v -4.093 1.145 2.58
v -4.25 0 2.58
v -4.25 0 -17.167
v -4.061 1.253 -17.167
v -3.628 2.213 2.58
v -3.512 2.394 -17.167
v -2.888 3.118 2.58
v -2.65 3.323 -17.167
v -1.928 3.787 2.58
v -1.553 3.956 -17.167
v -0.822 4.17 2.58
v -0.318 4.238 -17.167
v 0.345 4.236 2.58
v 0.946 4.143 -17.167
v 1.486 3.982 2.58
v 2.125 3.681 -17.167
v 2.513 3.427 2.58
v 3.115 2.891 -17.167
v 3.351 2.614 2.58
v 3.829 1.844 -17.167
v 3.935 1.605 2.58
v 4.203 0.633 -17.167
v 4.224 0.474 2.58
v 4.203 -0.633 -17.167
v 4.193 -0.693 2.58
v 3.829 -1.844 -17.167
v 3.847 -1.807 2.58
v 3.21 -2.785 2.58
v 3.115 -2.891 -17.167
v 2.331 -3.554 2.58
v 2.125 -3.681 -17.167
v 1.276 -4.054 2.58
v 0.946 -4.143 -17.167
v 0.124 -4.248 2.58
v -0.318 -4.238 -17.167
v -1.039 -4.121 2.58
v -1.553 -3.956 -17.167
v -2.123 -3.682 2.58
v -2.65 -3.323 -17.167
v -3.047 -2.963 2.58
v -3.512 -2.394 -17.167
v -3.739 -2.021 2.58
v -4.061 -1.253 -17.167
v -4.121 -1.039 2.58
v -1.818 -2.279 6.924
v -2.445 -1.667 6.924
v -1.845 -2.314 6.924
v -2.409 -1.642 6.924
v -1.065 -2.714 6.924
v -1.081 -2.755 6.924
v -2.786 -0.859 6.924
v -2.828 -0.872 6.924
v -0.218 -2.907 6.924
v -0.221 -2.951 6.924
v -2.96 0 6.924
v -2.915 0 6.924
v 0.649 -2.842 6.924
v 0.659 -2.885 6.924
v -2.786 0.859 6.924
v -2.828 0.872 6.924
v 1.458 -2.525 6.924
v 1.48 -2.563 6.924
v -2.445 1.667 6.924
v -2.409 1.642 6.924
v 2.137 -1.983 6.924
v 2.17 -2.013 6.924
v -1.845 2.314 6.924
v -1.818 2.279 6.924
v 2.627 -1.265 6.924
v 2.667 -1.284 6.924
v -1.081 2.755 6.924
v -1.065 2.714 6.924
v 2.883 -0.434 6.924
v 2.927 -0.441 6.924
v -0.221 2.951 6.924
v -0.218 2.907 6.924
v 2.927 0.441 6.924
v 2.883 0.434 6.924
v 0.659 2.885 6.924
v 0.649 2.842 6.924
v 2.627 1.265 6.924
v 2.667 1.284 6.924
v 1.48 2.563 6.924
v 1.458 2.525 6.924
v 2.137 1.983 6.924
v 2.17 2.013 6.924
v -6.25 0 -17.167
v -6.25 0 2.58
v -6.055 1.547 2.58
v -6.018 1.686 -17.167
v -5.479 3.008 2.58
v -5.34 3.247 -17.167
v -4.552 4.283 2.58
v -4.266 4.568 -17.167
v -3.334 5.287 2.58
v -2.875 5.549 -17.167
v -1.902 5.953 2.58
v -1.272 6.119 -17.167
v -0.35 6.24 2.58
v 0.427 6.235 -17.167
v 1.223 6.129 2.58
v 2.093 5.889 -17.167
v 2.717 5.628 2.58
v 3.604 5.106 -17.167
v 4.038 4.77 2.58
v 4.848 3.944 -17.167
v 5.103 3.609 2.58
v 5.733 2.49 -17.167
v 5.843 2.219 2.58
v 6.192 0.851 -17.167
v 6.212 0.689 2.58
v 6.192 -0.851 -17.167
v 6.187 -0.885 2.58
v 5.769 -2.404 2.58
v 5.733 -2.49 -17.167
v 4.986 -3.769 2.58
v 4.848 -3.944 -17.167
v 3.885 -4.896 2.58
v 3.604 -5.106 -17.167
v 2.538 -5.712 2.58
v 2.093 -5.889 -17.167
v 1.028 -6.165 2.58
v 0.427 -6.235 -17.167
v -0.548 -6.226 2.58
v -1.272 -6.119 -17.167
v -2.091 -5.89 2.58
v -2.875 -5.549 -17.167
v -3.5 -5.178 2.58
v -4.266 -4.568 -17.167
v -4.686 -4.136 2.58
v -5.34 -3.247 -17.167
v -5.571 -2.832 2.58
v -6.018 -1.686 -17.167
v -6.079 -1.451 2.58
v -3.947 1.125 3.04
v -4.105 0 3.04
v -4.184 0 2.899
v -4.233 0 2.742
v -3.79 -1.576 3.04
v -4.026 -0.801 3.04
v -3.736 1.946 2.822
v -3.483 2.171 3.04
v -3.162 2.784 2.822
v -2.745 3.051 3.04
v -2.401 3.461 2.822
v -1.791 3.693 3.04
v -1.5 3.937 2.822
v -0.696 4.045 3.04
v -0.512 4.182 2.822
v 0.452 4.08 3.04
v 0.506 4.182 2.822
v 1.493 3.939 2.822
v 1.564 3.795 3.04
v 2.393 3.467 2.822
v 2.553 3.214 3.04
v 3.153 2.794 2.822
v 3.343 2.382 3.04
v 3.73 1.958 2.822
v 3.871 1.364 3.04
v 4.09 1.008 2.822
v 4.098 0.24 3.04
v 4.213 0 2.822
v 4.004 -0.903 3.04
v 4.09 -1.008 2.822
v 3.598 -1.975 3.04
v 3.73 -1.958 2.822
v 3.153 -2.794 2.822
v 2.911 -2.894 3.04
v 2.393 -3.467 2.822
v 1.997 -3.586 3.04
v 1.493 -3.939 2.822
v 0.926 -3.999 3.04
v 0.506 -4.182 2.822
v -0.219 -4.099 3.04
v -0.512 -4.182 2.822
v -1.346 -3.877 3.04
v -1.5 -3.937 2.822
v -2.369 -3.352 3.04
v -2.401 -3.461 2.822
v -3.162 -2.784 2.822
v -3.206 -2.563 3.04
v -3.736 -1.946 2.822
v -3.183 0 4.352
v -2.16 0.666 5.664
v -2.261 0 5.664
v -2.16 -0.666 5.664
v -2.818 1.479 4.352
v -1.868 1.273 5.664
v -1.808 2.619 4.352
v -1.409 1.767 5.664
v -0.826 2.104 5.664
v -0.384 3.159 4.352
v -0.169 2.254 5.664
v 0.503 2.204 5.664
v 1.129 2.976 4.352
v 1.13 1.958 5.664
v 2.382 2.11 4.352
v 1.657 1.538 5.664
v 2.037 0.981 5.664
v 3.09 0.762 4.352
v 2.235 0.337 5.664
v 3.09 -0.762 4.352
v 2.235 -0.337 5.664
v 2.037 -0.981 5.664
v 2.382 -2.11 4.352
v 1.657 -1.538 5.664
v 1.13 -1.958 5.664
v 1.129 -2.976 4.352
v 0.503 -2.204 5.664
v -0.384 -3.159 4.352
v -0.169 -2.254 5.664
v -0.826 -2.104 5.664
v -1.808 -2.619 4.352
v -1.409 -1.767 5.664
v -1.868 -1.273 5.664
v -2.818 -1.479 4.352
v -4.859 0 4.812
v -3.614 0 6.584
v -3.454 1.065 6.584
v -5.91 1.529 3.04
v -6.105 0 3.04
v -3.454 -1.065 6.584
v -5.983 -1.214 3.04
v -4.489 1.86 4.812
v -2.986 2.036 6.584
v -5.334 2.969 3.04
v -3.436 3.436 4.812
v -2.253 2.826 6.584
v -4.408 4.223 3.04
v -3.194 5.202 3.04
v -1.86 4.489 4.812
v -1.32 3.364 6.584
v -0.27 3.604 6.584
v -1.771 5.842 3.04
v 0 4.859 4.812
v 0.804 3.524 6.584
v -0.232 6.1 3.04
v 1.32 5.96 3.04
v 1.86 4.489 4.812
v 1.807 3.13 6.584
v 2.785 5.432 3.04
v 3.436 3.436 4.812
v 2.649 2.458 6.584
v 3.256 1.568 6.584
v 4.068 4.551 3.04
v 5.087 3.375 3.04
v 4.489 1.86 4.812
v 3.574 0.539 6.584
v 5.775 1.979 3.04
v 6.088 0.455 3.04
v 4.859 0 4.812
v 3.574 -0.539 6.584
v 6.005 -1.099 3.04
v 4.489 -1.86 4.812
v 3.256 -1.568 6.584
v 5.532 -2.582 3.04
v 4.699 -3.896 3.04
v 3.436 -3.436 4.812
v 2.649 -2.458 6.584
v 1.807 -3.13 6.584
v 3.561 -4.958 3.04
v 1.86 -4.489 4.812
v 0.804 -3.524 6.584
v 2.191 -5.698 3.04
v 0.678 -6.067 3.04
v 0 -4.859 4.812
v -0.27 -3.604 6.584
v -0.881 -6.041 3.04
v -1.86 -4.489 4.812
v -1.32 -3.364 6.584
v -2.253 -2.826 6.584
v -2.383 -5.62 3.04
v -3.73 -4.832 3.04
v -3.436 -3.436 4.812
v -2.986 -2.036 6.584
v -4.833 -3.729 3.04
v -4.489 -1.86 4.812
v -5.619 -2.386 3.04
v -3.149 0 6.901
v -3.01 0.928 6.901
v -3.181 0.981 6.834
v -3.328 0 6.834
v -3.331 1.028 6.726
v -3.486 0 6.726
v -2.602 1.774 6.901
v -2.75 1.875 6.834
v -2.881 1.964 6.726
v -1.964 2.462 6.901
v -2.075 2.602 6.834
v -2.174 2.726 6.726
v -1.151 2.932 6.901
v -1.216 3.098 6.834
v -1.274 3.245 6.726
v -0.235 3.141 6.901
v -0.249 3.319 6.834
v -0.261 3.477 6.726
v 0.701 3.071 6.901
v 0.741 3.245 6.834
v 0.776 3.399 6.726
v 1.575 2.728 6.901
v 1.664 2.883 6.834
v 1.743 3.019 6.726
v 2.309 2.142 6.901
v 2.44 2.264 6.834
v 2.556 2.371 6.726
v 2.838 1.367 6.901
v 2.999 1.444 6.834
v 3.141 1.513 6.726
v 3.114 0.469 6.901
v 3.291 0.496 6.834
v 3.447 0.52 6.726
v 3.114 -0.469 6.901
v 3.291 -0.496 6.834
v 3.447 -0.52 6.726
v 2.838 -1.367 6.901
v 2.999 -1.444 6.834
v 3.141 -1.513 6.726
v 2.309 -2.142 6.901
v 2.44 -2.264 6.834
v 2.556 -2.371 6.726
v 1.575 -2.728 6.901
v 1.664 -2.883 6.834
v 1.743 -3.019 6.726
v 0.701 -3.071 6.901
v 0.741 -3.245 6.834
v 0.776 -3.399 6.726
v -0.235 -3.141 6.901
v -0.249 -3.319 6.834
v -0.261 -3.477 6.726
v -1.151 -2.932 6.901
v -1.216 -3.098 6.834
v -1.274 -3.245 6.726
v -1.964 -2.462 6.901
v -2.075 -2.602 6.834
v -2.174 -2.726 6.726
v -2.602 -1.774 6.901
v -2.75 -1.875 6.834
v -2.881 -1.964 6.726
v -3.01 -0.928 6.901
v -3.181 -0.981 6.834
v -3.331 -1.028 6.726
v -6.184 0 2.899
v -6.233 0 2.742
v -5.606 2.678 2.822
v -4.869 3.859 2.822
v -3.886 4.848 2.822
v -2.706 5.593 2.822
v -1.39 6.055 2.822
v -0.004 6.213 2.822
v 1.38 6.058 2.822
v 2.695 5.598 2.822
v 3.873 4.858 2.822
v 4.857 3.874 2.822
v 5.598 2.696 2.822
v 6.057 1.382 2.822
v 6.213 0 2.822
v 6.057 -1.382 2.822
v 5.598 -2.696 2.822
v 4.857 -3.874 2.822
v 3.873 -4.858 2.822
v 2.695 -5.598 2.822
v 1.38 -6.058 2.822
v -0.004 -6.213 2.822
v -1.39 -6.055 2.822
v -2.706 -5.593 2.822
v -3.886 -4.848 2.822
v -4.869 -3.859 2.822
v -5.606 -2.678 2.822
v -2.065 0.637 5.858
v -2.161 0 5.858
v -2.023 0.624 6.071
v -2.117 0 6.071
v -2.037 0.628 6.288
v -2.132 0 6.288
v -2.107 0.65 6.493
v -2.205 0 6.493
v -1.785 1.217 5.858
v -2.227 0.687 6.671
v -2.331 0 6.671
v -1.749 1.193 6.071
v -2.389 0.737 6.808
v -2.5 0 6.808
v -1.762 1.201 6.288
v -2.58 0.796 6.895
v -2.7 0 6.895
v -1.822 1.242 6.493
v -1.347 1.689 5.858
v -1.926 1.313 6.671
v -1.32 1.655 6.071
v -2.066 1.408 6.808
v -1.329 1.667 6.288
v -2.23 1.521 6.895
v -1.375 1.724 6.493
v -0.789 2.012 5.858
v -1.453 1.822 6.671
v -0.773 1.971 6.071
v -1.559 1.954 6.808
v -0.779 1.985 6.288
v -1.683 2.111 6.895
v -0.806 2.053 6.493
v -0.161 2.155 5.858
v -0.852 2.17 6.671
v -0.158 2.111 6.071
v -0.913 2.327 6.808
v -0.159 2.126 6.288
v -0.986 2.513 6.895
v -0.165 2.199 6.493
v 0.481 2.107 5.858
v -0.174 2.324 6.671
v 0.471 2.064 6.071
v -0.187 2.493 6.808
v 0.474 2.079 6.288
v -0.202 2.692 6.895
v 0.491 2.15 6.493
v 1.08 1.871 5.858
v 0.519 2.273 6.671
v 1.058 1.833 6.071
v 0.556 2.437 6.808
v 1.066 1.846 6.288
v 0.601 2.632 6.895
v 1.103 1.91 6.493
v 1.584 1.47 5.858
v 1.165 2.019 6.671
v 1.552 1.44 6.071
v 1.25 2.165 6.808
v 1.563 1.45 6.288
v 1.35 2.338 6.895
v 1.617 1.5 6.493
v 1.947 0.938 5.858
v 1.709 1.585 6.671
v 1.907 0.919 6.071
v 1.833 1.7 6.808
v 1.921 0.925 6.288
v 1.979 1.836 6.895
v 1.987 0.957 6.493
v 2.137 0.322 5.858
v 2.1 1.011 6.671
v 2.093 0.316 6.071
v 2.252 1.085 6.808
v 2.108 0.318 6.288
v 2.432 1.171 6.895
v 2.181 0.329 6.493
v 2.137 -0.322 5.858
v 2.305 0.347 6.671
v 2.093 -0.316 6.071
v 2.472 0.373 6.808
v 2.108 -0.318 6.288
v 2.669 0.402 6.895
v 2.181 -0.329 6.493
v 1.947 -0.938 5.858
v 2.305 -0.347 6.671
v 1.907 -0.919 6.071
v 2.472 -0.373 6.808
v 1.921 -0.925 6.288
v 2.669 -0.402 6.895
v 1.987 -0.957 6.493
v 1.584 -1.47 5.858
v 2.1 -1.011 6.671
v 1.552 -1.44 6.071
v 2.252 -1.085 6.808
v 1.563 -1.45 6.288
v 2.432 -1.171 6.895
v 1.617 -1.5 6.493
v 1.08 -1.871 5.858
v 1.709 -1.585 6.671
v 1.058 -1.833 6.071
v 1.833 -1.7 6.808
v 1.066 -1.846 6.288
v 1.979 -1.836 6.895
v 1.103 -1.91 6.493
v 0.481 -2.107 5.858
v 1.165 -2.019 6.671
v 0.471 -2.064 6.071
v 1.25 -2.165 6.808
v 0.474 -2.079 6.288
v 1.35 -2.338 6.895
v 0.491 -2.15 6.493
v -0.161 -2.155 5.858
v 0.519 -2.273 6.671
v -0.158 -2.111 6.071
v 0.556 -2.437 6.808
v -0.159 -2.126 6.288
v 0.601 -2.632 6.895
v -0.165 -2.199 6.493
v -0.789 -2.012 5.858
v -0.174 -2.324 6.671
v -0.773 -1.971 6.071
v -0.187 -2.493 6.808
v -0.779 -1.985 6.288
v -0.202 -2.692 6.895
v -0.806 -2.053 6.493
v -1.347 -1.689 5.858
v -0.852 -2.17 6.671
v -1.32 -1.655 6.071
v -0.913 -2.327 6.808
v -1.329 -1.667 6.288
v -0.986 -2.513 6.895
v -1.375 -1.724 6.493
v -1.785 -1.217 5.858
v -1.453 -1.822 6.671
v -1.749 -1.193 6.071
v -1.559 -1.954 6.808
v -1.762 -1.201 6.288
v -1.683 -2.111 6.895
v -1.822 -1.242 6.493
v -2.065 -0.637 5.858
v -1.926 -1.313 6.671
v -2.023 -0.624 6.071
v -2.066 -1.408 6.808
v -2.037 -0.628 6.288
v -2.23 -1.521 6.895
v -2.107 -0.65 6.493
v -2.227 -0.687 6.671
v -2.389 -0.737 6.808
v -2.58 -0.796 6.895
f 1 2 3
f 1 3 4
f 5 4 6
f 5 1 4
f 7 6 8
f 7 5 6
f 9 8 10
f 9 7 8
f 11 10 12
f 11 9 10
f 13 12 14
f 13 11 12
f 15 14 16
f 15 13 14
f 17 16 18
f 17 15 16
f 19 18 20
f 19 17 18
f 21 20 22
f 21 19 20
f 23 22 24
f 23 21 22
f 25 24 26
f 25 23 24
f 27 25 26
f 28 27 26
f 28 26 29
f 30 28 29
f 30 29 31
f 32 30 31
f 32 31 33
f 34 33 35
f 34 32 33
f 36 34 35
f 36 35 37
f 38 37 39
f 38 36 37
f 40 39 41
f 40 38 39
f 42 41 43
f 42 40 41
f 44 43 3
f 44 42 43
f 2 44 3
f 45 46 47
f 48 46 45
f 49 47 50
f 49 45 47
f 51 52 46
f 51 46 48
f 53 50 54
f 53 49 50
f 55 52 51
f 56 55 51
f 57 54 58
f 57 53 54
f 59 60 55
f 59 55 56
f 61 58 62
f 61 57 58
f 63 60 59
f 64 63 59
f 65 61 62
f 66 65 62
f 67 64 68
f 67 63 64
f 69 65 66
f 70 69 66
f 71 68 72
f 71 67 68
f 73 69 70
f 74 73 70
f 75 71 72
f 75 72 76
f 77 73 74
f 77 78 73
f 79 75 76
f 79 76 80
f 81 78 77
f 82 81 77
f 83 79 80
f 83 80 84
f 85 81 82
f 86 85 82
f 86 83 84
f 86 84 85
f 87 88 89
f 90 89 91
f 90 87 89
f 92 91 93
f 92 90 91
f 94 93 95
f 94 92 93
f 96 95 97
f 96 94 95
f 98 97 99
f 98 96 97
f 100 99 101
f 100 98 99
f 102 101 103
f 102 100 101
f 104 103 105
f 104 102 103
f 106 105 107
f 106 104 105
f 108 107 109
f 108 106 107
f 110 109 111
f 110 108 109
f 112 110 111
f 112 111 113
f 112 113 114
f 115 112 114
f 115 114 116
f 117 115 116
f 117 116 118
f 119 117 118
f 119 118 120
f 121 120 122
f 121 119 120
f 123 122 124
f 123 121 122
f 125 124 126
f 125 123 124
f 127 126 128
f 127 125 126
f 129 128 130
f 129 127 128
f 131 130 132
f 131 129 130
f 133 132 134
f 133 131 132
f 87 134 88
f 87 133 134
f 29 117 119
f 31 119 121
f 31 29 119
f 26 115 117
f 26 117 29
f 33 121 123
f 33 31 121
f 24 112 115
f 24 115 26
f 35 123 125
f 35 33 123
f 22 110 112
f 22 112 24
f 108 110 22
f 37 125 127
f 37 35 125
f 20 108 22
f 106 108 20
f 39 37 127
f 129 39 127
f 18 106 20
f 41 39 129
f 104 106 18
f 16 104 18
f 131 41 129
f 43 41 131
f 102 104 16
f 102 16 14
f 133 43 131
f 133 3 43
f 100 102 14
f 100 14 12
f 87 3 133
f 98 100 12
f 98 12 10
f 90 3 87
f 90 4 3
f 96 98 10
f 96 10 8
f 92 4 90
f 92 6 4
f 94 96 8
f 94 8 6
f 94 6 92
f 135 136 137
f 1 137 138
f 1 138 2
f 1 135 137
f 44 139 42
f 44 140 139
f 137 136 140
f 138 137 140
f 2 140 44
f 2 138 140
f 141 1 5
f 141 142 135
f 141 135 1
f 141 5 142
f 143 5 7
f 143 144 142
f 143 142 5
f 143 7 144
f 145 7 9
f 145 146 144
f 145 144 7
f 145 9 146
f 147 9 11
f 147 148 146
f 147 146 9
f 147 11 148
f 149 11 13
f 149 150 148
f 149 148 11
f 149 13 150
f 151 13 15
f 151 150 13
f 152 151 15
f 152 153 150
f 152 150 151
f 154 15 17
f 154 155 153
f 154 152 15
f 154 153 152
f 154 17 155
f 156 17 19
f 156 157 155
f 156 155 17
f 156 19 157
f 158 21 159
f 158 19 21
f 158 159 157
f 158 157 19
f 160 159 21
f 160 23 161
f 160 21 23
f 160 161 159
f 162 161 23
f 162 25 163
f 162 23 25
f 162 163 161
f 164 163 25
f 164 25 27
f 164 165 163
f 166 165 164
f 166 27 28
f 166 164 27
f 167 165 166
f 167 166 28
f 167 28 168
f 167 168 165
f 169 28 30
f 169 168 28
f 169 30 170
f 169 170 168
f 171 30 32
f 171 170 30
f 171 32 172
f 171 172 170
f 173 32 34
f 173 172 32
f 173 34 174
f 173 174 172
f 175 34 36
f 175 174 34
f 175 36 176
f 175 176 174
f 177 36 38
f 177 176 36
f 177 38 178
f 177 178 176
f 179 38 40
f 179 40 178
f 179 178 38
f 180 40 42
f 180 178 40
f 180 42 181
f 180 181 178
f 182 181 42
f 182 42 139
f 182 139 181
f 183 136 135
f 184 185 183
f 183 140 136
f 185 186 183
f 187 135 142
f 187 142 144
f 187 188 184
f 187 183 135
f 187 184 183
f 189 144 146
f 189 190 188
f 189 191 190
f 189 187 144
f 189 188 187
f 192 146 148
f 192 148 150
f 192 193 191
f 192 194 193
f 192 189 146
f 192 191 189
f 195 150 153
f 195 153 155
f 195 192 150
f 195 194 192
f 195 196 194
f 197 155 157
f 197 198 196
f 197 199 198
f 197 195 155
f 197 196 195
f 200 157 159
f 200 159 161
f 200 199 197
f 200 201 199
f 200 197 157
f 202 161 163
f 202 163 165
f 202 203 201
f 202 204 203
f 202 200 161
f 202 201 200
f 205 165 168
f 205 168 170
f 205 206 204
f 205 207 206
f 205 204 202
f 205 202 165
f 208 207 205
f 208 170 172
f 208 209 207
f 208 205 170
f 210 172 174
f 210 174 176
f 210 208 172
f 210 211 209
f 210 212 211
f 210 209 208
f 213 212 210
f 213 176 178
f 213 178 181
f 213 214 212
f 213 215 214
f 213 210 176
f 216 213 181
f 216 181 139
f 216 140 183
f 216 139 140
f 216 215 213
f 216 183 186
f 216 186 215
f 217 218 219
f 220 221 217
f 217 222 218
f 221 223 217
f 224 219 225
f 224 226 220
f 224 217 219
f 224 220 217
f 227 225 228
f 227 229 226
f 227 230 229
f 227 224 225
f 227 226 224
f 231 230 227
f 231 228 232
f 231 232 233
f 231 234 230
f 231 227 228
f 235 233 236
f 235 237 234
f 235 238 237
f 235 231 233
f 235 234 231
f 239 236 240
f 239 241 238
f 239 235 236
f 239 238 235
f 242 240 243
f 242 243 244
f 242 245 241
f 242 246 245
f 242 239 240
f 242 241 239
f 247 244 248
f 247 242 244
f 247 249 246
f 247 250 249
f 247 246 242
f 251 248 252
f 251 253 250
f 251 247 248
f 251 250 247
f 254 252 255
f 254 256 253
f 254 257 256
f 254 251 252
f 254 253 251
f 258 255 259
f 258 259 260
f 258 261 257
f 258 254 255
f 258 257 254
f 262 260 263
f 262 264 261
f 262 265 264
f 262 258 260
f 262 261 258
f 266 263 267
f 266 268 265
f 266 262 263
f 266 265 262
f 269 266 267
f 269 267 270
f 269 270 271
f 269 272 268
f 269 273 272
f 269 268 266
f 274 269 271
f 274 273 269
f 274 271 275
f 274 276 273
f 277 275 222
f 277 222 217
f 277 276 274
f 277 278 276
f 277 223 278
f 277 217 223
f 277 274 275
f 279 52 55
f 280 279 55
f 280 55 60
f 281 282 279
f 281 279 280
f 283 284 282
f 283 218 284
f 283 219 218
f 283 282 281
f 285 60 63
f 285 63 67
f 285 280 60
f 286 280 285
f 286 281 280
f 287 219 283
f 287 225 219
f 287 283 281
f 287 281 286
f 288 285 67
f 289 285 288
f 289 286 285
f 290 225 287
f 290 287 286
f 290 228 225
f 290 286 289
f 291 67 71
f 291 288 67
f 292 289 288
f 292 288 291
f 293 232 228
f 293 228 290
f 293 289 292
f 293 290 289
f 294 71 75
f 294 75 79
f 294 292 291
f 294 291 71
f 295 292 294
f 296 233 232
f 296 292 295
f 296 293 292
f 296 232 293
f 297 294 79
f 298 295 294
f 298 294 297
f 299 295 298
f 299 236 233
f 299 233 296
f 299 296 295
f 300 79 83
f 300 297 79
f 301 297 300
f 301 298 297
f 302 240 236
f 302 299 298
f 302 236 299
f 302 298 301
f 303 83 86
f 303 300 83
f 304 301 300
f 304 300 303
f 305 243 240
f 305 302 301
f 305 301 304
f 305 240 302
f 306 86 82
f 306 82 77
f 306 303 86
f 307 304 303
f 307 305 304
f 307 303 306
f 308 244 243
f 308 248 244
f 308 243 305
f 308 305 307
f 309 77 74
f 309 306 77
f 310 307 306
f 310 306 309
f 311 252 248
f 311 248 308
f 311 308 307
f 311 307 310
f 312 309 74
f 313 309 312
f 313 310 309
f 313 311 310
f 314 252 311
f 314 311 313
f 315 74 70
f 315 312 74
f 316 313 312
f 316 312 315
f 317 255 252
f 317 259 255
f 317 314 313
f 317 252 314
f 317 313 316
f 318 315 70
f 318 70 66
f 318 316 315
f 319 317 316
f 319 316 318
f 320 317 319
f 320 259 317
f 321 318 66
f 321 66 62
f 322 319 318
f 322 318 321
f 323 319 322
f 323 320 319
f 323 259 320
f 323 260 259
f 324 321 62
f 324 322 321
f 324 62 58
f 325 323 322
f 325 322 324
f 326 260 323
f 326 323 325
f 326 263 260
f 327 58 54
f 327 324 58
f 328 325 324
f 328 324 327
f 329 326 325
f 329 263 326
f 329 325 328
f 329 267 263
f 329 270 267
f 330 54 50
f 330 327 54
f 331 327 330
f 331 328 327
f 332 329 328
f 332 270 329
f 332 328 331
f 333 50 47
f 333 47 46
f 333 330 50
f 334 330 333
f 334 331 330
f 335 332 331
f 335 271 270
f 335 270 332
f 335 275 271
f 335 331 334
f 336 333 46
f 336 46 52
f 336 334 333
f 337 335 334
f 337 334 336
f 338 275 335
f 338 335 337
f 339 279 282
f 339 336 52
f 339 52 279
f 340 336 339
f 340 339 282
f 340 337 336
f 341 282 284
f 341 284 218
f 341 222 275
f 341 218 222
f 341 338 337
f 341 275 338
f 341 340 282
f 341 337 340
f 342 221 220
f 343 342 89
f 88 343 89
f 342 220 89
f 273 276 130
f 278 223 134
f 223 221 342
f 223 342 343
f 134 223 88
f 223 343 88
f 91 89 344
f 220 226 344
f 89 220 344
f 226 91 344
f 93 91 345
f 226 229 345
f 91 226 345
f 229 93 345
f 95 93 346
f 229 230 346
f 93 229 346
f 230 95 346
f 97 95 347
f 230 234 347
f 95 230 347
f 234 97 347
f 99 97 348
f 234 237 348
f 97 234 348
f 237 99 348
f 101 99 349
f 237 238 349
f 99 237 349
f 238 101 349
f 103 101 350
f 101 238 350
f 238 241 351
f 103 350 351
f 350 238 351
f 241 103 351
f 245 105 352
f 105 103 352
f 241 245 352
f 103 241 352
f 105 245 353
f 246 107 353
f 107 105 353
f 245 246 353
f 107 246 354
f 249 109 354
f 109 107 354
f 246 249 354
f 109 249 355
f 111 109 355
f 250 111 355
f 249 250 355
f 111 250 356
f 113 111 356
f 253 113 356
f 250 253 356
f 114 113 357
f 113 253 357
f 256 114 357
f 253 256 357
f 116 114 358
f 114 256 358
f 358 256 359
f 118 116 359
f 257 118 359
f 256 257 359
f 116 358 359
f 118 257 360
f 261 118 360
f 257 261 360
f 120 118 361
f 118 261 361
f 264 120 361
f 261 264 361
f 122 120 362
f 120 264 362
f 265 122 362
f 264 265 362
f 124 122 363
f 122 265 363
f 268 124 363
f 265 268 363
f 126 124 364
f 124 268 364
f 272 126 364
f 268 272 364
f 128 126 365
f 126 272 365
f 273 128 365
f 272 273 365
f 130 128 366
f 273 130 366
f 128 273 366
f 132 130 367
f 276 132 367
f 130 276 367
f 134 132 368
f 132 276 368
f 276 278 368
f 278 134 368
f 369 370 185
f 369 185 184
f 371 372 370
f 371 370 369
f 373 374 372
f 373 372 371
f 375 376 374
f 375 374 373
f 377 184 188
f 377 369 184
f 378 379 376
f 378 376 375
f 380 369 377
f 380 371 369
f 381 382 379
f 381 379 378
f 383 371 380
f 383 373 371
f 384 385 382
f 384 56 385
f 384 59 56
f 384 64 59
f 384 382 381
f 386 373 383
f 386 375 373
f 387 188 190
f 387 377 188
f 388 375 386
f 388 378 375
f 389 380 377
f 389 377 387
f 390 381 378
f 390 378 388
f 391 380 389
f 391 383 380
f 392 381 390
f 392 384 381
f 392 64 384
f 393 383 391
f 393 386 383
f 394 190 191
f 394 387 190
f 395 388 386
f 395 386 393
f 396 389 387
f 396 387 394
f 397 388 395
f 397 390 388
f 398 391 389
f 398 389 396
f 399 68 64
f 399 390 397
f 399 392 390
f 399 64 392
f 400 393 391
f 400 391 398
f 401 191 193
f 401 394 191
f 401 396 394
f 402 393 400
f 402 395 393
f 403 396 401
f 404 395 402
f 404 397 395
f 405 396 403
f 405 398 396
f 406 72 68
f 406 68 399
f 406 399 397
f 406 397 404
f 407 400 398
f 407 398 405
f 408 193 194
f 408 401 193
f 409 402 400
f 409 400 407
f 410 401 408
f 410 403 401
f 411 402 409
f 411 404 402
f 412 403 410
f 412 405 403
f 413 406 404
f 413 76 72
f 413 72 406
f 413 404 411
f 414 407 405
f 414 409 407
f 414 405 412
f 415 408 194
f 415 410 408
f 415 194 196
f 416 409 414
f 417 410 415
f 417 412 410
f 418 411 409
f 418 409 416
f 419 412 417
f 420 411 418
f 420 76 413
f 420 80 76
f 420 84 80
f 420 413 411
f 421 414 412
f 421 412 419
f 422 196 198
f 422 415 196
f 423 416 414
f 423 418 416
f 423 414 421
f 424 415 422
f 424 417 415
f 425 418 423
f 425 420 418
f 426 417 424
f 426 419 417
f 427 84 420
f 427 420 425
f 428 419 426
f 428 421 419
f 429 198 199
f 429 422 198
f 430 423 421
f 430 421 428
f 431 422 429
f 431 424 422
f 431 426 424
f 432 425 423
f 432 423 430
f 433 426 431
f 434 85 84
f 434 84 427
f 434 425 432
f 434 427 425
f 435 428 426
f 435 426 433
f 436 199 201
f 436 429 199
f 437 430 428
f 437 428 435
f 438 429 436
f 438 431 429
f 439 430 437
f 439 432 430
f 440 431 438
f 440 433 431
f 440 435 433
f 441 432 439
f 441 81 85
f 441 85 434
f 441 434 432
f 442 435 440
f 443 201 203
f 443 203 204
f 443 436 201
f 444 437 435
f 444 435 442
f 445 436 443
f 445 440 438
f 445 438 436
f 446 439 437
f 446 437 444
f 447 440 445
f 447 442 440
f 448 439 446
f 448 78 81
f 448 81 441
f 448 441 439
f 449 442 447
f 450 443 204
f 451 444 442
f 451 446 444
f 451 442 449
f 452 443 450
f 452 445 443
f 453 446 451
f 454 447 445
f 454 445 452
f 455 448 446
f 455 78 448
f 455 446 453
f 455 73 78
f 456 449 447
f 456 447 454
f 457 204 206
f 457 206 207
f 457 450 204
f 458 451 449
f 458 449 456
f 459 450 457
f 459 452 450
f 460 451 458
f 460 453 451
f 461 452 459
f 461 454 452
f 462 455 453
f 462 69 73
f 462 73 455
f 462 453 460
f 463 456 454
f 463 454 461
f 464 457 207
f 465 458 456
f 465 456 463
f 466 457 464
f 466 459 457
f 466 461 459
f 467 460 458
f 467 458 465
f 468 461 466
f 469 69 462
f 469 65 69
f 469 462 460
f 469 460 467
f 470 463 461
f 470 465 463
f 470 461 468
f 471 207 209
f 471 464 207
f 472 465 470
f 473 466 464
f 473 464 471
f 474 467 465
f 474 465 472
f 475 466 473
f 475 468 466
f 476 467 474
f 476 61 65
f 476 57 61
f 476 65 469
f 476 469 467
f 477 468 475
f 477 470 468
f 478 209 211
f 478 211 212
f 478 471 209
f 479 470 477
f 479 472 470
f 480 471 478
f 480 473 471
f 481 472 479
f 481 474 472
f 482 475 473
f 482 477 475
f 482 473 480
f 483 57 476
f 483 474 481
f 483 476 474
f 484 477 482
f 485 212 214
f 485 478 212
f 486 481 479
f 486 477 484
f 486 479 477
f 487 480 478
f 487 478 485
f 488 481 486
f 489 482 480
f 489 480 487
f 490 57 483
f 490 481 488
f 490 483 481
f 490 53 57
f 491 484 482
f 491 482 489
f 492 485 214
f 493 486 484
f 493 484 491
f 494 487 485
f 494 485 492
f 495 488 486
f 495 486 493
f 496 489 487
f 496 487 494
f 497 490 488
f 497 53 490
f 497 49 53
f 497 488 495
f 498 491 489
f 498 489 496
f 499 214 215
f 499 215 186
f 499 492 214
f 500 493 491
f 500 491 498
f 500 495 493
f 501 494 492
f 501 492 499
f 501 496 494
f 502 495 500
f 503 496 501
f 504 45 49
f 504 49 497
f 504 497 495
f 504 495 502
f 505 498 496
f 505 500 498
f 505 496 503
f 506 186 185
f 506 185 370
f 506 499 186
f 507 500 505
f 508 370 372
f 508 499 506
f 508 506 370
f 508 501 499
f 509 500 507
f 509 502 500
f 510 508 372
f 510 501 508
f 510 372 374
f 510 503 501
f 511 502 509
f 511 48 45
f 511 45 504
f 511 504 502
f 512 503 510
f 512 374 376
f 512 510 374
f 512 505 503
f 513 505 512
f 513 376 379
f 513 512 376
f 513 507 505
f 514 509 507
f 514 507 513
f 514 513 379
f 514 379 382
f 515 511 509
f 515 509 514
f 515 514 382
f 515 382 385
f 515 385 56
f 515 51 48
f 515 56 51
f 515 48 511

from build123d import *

# Parameters (mm, degrees)
F2_R = 0.8


with BuildPart() as f1:
    # F0 (on Front) → F1 (revolve)
    with BuildSketch(Plane.XZ):
        Polygon((-4.25, 2.833334), (-1.375272, 6.924292), (-3.375272, 6.924292), (-6.25, 2.833334), (-6.25, -17.166666), (-4.25, -17.166666), align=None)
    revolve(axis=Axis((0, 0, -1.357143), (0, 0, -1)))

    # F2
    f2_edges = [f1.edges().sort_by_distance(p)[0] for p in [
        (1.375272, 0, 6.924292),
        (3.375272, 0, 6.924292),
        (6.25, 0, 2.833334),
        (4.25, 0, 2.833334),
        (-2.812636, 0, 4.878813),
    ]]
    fillet(f2_edges, radius=F2_R)


solid = f1.part
